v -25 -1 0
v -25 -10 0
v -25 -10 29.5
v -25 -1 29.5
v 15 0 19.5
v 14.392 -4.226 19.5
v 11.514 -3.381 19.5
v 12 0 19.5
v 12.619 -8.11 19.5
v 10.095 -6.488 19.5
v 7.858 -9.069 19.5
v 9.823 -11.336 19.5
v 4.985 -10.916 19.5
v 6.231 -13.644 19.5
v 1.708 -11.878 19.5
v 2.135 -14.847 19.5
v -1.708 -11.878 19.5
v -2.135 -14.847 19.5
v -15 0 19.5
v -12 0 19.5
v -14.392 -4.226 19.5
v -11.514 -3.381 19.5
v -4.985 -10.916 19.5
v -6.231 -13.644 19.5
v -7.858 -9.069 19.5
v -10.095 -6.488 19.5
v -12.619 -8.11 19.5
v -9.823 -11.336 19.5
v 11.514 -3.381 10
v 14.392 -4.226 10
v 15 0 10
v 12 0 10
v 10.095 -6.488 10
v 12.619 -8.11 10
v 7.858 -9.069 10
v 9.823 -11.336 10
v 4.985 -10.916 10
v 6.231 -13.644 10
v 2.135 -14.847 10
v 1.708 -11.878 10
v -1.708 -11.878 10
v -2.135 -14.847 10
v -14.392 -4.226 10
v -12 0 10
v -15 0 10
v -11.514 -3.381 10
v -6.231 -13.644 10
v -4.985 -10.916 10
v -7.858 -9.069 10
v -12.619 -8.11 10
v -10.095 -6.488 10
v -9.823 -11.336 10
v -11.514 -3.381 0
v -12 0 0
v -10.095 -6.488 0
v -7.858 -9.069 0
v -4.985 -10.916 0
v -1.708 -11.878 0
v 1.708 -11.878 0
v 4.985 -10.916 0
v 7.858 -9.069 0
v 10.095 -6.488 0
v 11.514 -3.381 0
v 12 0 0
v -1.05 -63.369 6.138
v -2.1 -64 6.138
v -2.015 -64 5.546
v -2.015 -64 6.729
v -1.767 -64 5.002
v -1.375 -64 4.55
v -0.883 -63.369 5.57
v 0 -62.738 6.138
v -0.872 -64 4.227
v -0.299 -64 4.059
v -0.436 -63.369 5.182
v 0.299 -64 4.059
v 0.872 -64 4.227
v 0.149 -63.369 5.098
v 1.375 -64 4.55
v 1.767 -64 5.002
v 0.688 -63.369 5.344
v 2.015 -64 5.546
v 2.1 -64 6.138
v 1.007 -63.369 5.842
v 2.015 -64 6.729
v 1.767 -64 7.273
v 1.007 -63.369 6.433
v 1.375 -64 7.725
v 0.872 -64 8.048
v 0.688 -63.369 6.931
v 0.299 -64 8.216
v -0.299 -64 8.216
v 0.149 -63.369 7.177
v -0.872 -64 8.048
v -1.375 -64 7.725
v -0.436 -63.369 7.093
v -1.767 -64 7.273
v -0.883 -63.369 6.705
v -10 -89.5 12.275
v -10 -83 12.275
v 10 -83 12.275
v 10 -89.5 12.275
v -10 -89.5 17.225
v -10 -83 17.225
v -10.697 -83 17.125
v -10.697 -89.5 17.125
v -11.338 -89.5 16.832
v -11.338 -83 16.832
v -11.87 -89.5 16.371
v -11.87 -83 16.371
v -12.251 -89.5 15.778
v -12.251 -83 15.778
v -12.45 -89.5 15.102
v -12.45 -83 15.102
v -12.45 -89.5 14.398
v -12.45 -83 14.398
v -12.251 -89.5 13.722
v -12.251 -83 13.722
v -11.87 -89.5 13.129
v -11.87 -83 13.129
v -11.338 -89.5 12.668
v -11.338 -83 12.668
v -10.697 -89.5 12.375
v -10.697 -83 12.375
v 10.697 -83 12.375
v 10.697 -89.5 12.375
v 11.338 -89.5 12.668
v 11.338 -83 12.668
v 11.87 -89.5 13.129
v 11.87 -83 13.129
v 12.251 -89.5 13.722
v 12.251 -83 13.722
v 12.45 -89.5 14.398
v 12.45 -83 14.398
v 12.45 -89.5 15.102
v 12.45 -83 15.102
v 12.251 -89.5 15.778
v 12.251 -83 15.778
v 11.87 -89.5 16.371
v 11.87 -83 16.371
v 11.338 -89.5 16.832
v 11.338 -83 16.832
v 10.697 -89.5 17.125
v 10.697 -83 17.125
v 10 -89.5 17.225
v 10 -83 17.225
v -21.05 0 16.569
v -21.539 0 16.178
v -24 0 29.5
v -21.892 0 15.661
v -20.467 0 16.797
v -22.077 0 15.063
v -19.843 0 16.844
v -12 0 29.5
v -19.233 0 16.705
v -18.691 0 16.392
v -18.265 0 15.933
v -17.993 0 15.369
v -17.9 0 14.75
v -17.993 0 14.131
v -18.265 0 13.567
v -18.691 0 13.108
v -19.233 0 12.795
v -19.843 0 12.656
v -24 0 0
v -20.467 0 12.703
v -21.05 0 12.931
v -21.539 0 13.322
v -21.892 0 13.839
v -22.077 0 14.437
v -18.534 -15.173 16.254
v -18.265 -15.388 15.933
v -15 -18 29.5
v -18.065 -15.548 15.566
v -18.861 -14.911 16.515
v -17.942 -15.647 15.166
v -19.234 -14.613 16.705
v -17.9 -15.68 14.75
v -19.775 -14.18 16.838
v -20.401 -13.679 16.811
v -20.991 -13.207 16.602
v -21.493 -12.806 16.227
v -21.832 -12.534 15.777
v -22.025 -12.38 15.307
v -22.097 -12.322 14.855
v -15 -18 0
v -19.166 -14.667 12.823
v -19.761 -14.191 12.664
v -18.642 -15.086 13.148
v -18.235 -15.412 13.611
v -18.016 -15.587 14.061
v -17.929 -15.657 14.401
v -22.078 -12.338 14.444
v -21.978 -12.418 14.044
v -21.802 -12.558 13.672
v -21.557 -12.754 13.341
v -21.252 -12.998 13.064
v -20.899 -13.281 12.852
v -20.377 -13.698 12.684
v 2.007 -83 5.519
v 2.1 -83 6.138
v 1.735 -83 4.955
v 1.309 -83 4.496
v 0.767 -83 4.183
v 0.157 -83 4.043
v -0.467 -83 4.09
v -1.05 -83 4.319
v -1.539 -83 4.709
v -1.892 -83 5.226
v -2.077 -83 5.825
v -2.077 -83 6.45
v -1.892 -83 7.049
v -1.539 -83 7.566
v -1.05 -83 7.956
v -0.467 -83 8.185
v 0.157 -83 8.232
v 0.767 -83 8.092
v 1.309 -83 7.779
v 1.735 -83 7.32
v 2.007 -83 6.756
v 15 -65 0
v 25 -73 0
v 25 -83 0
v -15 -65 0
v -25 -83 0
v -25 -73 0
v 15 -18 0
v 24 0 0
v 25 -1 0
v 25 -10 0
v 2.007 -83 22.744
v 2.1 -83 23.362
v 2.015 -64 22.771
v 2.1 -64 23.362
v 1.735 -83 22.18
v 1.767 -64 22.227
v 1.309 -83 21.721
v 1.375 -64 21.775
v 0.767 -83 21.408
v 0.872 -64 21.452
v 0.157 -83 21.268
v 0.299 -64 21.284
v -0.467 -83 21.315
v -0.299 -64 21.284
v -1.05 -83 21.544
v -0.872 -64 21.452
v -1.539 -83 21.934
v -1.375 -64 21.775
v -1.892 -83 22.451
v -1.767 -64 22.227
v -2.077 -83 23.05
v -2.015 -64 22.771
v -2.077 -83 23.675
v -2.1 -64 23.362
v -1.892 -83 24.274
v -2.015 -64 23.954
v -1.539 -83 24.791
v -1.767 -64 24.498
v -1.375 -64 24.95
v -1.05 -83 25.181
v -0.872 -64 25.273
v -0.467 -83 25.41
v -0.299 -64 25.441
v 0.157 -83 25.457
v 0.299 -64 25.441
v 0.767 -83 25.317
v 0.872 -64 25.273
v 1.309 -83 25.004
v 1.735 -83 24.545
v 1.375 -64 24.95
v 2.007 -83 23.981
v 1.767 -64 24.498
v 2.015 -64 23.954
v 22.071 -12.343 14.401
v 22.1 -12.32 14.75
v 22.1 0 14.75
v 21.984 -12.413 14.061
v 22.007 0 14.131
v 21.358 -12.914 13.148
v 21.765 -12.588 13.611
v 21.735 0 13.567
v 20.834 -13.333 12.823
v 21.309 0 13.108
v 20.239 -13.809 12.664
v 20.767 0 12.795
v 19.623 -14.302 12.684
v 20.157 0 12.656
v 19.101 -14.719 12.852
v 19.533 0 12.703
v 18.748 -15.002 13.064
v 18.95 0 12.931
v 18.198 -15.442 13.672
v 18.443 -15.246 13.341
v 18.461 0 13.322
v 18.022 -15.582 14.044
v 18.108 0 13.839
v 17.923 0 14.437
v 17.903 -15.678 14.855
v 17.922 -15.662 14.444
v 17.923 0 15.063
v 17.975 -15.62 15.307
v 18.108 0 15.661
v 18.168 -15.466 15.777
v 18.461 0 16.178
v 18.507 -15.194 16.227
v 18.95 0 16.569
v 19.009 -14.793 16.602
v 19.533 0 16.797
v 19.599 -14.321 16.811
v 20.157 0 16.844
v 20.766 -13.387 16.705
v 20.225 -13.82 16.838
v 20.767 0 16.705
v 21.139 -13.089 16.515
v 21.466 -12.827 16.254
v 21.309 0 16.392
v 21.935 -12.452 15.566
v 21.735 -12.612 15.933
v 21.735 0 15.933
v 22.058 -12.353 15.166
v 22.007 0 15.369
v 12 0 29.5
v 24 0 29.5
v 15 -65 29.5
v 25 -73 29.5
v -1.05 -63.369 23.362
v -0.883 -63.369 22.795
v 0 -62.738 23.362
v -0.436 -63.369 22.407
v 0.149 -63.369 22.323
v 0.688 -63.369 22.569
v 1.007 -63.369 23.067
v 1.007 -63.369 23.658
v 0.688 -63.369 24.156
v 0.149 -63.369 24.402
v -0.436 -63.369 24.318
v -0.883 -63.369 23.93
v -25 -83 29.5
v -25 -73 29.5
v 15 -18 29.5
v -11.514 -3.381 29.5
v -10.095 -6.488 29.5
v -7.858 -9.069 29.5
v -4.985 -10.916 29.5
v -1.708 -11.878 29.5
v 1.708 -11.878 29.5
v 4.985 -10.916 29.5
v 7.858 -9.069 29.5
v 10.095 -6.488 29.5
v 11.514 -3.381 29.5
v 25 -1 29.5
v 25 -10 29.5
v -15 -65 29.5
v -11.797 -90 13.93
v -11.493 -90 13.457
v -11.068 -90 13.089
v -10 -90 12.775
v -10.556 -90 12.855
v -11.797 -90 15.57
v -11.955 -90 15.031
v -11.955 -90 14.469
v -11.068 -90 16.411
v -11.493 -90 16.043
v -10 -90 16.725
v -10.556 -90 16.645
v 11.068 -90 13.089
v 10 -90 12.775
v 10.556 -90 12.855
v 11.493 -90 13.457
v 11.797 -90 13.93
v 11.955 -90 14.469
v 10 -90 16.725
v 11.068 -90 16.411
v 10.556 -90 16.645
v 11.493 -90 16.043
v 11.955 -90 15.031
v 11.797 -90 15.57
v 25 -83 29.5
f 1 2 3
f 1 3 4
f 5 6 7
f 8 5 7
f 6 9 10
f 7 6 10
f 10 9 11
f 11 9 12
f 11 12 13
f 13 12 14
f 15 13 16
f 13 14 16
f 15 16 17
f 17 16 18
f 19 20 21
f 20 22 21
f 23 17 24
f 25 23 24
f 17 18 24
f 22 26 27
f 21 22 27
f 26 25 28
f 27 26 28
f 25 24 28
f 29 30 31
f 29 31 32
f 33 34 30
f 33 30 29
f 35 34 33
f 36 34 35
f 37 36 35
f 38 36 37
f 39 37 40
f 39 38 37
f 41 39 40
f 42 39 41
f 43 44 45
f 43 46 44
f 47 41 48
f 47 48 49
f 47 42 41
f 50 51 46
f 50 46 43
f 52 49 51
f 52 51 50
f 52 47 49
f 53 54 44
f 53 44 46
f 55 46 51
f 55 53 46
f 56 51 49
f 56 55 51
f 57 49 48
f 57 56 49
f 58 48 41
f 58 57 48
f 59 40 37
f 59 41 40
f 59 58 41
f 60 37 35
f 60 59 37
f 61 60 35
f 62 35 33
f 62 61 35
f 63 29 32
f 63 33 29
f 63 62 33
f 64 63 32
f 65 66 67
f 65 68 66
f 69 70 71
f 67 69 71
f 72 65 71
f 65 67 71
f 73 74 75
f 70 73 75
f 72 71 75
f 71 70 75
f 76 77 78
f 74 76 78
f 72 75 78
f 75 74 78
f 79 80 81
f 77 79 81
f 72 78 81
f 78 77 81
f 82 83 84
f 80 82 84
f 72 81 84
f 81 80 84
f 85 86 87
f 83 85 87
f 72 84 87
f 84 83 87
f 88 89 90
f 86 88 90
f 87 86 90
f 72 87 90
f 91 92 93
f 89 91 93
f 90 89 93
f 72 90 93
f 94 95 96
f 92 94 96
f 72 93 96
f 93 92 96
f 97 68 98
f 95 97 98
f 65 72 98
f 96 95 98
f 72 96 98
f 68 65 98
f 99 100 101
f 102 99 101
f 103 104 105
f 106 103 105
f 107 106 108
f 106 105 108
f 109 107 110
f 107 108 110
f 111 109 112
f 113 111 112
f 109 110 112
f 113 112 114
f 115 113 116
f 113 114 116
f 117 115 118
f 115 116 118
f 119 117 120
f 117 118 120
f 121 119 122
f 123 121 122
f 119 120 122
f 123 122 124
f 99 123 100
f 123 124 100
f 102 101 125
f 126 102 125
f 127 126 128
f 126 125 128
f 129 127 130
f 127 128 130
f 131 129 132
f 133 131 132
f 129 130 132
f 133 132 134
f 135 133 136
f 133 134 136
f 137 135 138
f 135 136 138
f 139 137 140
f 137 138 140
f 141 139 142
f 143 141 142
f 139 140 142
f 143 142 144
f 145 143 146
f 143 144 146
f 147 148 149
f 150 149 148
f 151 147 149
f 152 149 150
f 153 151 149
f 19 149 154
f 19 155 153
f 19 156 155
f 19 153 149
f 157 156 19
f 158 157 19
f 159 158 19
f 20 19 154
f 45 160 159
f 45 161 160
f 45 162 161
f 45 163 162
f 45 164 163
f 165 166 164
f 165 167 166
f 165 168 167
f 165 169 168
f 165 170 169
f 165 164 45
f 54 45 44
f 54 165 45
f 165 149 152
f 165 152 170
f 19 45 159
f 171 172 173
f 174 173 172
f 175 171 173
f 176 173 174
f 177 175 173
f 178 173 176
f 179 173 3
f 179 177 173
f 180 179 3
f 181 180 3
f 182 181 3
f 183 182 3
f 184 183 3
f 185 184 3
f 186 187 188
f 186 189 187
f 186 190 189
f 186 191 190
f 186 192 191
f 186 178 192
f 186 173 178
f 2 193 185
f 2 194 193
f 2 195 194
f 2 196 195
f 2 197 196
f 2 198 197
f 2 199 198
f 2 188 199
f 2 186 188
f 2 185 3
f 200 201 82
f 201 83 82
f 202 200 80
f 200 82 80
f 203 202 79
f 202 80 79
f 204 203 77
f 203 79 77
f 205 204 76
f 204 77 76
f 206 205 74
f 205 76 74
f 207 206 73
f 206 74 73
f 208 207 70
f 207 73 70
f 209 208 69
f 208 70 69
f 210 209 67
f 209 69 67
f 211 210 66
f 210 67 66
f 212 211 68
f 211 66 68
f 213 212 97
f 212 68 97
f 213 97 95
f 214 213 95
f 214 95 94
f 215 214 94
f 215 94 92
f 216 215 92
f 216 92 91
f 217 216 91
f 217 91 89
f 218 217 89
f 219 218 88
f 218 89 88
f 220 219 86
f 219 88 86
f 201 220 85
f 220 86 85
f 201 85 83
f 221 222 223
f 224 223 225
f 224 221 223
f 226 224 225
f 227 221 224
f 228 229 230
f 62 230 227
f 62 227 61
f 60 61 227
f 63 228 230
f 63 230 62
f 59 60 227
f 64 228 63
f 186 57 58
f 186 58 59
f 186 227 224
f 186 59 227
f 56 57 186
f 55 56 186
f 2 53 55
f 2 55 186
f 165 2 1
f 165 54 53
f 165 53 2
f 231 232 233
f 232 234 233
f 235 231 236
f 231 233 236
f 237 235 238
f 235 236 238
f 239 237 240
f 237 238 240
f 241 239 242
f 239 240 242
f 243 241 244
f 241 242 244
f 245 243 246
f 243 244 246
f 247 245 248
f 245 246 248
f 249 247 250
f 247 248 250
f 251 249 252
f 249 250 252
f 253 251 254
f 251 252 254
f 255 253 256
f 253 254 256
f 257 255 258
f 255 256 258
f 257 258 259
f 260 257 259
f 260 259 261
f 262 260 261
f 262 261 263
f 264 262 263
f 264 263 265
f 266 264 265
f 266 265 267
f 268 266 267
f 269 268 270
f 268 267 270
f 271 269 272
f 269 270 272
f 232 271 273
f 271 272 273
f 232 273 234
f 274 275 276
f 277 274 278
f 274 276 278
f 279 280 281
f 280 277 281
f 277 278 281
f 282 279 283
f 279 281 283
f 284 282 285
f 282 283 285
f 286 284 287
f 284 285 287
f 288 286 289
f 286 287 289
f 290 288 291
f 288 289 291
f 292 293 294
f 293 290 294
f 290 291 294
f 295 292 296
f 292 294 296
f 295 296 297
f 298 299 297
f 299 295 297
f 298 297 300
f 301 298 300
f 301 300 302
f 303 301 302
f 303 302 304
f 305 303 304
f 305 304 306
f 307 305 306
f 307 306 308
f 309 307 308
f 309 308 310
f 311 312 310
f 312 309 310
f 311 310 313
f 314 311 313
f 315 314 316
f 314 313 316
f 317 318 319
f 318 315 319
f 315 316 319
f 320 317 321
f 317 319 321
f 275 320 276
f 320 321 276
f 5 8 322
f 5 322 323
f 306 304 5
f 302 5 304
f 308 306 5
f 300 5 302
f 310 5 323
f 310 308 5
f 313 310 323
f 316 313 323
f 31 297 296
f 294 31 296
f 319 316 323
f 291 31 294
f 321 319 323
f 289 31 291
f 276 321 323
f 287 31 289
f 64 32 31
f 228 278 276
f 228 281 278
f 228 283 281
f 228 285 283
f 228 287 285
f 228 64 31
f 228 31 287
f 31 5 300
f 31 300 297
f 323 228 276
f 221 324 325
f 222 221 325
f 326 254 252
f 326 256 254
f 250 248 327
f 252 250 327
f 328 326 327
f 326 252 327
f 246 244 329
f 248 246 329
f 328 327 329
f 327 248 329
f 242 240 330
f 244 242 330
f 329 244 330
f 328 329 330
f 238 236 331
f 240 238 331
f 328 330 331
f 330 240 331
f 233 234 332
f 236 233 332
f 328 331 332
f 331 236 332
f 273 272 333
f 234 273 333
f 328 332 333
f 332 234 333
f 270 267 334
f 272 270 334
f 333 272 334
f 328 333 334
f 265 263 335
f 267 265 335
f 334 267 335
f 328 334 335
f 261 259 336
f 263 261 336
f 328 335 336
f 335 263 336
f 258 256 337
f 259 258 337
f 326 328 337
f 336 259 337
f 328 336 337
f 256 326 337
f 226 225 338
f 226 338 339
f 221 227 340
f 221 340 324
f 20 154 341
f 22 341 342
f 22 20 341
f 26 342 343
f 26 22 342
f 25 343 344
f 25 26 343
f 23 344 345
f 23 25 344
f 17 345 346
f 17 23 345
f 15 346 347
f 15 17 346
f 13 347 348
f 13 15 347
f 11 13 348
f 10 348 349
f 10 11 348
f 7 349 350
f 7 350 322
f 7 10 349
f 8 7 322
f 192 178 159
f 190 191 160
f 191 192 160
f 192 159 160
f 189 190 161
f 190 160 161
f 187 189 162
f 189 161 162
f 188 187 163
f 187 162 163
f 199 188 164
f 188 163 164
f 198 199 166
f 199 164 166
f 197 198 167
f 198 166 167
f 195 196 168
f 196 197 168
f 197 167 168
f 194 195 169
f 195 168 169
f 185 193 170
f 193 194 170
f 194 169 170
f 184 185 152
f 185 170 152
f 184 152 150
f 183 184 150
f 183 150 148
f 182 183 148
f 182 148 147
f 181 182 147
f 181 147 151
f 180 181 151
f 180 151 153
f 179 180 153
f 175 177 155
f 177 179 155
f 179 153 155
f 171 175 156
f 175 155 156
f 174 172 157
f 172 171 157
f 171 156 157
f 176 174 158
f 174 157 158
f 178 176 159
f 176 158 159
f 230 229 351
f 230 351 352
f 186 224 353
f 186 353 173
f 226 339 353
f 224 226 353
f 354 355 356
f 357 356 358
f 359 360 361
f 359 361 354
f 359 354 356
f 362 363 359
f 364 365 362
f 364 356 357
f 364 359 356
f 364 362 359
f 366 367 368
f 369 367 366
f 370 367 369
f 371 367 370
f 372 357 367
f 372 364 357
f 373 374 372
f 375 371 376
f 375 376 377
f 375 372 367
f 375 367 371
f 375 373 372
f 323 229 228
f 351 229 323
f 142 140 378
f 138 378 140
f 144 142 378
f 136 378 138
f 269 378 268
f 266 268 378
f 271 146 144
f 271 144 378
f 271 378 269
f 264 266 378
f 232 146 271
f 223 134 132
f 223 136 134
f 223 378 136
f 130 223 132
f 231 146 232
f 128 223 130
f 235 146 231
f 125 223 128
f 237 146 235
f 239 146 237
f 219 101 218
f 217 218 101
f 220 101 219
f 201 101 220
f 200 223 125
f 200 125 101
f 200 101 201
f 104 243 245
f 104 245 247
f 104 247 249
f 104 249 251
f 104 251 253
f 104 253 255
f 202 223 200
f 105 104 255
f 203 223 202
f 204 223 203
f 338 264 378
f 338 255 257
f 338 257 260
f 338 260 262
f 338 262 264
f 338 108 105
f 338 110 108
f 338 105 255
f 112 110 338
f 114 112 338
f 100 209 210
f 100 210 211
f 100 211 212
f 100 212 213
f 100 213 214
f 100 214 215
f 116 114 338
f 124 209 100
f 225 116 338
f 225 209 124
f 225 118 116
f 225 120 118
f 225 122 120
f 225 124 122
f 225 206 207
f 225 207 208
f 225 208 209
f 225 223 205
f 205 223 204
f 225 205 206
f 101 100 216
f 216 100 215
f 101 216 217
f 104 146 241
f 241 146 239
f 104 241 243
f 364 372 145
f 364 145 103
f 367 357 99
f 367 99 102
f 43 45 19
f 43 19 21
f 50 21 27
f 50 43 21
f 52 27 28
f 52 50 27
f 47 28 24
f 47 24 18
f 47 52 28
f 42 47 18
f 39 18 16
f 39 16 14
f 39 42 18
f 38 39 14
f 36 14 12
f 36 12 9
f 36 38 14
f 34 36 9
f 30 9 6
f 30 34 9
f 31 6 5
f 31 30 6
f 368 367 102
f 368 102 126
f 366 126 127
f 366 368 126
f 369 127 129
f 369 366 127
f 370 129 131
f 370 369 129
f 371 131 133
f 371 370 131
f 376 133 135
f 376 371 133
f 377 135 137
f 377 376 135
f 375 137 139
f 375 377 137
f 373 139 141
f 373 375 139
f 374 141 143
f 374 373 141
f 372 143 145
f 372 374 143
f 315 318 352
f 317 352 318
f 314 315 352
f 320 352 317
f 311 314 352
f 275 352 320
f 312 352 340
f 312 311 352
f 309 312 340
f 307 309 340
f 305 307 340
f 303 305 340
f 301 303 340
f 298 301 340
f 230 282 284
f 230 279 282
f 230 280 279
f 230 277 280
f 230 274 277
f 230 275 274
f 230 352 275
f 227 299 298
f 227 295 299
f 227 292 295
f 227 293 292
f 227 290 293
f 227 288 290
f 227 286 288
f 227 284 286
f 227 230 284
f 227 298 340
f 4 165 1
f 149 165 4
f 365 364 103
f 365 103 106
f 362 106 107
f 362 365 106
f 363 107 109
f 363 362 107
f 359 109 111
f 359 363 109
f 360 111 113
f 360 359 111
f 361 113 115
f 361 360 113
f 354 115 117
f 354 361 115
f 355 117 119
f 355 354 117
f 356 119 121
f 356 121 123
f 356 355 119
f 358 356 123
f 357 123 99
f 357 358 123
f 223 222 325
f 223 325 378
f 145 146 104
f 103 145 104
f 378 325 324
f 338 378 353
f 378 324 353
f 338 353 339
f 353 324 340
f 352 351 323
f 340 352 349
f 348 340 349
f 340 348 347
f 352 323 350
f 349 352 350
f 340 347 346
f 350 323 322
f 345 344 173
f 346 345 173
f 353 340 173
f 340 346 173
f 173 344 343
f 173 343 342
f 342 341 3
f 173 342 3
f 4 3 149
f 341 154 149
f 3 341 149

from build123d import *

# Parameters (mm, degrees)
BOSS_EXTRUDE1_DEPTH = 29.5
BOSS_EXTRUDE2_DEPTH = 7
CHAMFER1_SIZE       = 0.5
M5X0_82_D           = 4.2
M5X0_82_DEPTH       = 19
M5X0_82_TIP         = 1.2618073
SKETCH13_W          = 8.675232358
SKETCH13_H          = 9.5
M5X0_81_REACH       = 99.955
M5X0_81_BORE_R      = 2.1
CHAMFER_1_SIZE      = 1


with BuildPart() as part:
    # Sketch1 → Boss-Extrude1 (new body)
    with BuildSketch(Plane.XY):
        with BuildLine():
            Line((12, 0), (25, 0))
            Line((25, 0), (25, -10))
            Line((25, -10), (15, -18))
            Line((15, -18), (15, -65))
            Line((15, -65), (25, -73))
            Line((25, -73), (25, -83))
            Line((25, -83), (-25, -83))
            Line((-25, -83), (-25, -73))
            Line((-25, -73), (-15, -65))
            Line((-15, -65), (-15, -18))
            Line((-15, -18), (-25, -10))
            Line((-25, -10), (-25, 0))
            Line((-25, 0), (-12, 0))
            ThreePointArc((-12, 0), (0, -12), (12, 0))
        make_face()
    extrude(amount=BOSS_EXTRUDE1_DEPTH)

    # Sketch2 → Boss-Extrude2 (add)
    with BuildSketch(Plane.XZ.offset(83)):
        with BuildLine():
            Line((-10, 12.275), (10, 12.275))
            ThreePointArc((10, 12.275), (12.475, 14.75), (10, 17.225))
            Line((10, 17.225), (-10, 17.225))
            ThreePointArc((-10, 17.225), (-12.475, 14.75), (-10, 12.275))
        make_face()
    extrude(amount=BOSS_EXTRUDE2_DEPTH)

    # Chamfer1
    chamfer1_edges = [part.edges().sort_by_distance(p)[0] for p in [
        (12.475, -90, 14.75),
        (0, -90, 17.225),
        (-12.475, -90, 14.75),
        (0, -90, 12.275),
    ]]
    chamfer(chamfer1_edges, length=CHAMFER1_SIZE)

    # Отверстие обработанное метчиком M5x0.82
    with Locations(Plane(origin=(0, -83, 0), x_dir=(-1, 0, 0), z_dir=(0, -1, 0))):
        with Locations((0, -23.3625), (0, -6.1375)):
            Hole(M5X0_82_D / 2, depth=M5X0_82_DEPTH)
            with Locations((0, 0, -(M5X0_82_DEPTH + M5X0_82_TIP / 2))):  # 118° drill point
                Cone(0, M5X0_82_D / 2, M5X0_82_TIP, mode=Mode.SUBTRACT)

    # Sketch13 → Cut-Revolve1 (revolve, cut)
    with BuildSketch(Plane(origin=(0, 0, 0), x_dir=(1, 0, 0), z_dir=(0, 1, 0))):
        with Locations((-10.662383821, -14.75)):
            Rectangle(SKETCH13_W, SKETCH13_H)
    revolve(axis=Axis((0, 0, 0), (0, 0, 1)), mode=Mode.SUBTRACT)

    # Отверстие обработанное метчиком M5x0.81 bore → Отверстие обработанное метчиком M5x0.81 (cut, up to next)
    with BuildSketch(Plane(origin=(0, 0, 0), x_dir=(1, 0, 0), z_dir=(0, 1, 0)), mode=Mode.PRIVATE) as m5x0_81_sk1:
        with Locations((-20, -14.75)):
            Circle(M5X0_81_BORE_R)
    m5x0_81_tool1 = extrude(m5x0_81_sk1.sketch, amount=-M5X0_81_REACH, mode=Mode.PRIVATE) & part.part
    # Отверстие обработанное метчиком M5x0.81 bore → Отверстие обработанное метчиком M5x0.81 (cut, up to next)
    with BuildSketch(Plane(origin=(0, 0, 0), x_dir=(1, 0, 0), z_dir=(0, 1, 0)), mode=Mode.PRIVATE) as m5x0_81_sk2:
        with Locations((20, -14.75)):
            Circle(M5X0_81_BORE_R)
    m5x0_81_tool2 = extrude(m5x0_81_sk2.sketch, amount=-M5X0_81_REACH, mode=Mode.PRIVATE) & part.part
    add(m5x0_81_tool1.solids().sort_by_distance((-20, 0, 14.75))[0], mode=Mode.SUBTRACT)
    add(m5x0_81_tool2.solids().sort_by_distance((20, 0, 14.75))[0], mode=Mode.SUBTRACT)

    # Фаска1
    chamfer_1_edges = [part.edges().sort_by_distance(p)[0] for p in [
        (-25, 0, 14.75),
        (25, 0, 14.75),
    ]]
    chamfer(chamfer_1_edges, length=CHAMFER_1_SIZE)


solid = part.part
